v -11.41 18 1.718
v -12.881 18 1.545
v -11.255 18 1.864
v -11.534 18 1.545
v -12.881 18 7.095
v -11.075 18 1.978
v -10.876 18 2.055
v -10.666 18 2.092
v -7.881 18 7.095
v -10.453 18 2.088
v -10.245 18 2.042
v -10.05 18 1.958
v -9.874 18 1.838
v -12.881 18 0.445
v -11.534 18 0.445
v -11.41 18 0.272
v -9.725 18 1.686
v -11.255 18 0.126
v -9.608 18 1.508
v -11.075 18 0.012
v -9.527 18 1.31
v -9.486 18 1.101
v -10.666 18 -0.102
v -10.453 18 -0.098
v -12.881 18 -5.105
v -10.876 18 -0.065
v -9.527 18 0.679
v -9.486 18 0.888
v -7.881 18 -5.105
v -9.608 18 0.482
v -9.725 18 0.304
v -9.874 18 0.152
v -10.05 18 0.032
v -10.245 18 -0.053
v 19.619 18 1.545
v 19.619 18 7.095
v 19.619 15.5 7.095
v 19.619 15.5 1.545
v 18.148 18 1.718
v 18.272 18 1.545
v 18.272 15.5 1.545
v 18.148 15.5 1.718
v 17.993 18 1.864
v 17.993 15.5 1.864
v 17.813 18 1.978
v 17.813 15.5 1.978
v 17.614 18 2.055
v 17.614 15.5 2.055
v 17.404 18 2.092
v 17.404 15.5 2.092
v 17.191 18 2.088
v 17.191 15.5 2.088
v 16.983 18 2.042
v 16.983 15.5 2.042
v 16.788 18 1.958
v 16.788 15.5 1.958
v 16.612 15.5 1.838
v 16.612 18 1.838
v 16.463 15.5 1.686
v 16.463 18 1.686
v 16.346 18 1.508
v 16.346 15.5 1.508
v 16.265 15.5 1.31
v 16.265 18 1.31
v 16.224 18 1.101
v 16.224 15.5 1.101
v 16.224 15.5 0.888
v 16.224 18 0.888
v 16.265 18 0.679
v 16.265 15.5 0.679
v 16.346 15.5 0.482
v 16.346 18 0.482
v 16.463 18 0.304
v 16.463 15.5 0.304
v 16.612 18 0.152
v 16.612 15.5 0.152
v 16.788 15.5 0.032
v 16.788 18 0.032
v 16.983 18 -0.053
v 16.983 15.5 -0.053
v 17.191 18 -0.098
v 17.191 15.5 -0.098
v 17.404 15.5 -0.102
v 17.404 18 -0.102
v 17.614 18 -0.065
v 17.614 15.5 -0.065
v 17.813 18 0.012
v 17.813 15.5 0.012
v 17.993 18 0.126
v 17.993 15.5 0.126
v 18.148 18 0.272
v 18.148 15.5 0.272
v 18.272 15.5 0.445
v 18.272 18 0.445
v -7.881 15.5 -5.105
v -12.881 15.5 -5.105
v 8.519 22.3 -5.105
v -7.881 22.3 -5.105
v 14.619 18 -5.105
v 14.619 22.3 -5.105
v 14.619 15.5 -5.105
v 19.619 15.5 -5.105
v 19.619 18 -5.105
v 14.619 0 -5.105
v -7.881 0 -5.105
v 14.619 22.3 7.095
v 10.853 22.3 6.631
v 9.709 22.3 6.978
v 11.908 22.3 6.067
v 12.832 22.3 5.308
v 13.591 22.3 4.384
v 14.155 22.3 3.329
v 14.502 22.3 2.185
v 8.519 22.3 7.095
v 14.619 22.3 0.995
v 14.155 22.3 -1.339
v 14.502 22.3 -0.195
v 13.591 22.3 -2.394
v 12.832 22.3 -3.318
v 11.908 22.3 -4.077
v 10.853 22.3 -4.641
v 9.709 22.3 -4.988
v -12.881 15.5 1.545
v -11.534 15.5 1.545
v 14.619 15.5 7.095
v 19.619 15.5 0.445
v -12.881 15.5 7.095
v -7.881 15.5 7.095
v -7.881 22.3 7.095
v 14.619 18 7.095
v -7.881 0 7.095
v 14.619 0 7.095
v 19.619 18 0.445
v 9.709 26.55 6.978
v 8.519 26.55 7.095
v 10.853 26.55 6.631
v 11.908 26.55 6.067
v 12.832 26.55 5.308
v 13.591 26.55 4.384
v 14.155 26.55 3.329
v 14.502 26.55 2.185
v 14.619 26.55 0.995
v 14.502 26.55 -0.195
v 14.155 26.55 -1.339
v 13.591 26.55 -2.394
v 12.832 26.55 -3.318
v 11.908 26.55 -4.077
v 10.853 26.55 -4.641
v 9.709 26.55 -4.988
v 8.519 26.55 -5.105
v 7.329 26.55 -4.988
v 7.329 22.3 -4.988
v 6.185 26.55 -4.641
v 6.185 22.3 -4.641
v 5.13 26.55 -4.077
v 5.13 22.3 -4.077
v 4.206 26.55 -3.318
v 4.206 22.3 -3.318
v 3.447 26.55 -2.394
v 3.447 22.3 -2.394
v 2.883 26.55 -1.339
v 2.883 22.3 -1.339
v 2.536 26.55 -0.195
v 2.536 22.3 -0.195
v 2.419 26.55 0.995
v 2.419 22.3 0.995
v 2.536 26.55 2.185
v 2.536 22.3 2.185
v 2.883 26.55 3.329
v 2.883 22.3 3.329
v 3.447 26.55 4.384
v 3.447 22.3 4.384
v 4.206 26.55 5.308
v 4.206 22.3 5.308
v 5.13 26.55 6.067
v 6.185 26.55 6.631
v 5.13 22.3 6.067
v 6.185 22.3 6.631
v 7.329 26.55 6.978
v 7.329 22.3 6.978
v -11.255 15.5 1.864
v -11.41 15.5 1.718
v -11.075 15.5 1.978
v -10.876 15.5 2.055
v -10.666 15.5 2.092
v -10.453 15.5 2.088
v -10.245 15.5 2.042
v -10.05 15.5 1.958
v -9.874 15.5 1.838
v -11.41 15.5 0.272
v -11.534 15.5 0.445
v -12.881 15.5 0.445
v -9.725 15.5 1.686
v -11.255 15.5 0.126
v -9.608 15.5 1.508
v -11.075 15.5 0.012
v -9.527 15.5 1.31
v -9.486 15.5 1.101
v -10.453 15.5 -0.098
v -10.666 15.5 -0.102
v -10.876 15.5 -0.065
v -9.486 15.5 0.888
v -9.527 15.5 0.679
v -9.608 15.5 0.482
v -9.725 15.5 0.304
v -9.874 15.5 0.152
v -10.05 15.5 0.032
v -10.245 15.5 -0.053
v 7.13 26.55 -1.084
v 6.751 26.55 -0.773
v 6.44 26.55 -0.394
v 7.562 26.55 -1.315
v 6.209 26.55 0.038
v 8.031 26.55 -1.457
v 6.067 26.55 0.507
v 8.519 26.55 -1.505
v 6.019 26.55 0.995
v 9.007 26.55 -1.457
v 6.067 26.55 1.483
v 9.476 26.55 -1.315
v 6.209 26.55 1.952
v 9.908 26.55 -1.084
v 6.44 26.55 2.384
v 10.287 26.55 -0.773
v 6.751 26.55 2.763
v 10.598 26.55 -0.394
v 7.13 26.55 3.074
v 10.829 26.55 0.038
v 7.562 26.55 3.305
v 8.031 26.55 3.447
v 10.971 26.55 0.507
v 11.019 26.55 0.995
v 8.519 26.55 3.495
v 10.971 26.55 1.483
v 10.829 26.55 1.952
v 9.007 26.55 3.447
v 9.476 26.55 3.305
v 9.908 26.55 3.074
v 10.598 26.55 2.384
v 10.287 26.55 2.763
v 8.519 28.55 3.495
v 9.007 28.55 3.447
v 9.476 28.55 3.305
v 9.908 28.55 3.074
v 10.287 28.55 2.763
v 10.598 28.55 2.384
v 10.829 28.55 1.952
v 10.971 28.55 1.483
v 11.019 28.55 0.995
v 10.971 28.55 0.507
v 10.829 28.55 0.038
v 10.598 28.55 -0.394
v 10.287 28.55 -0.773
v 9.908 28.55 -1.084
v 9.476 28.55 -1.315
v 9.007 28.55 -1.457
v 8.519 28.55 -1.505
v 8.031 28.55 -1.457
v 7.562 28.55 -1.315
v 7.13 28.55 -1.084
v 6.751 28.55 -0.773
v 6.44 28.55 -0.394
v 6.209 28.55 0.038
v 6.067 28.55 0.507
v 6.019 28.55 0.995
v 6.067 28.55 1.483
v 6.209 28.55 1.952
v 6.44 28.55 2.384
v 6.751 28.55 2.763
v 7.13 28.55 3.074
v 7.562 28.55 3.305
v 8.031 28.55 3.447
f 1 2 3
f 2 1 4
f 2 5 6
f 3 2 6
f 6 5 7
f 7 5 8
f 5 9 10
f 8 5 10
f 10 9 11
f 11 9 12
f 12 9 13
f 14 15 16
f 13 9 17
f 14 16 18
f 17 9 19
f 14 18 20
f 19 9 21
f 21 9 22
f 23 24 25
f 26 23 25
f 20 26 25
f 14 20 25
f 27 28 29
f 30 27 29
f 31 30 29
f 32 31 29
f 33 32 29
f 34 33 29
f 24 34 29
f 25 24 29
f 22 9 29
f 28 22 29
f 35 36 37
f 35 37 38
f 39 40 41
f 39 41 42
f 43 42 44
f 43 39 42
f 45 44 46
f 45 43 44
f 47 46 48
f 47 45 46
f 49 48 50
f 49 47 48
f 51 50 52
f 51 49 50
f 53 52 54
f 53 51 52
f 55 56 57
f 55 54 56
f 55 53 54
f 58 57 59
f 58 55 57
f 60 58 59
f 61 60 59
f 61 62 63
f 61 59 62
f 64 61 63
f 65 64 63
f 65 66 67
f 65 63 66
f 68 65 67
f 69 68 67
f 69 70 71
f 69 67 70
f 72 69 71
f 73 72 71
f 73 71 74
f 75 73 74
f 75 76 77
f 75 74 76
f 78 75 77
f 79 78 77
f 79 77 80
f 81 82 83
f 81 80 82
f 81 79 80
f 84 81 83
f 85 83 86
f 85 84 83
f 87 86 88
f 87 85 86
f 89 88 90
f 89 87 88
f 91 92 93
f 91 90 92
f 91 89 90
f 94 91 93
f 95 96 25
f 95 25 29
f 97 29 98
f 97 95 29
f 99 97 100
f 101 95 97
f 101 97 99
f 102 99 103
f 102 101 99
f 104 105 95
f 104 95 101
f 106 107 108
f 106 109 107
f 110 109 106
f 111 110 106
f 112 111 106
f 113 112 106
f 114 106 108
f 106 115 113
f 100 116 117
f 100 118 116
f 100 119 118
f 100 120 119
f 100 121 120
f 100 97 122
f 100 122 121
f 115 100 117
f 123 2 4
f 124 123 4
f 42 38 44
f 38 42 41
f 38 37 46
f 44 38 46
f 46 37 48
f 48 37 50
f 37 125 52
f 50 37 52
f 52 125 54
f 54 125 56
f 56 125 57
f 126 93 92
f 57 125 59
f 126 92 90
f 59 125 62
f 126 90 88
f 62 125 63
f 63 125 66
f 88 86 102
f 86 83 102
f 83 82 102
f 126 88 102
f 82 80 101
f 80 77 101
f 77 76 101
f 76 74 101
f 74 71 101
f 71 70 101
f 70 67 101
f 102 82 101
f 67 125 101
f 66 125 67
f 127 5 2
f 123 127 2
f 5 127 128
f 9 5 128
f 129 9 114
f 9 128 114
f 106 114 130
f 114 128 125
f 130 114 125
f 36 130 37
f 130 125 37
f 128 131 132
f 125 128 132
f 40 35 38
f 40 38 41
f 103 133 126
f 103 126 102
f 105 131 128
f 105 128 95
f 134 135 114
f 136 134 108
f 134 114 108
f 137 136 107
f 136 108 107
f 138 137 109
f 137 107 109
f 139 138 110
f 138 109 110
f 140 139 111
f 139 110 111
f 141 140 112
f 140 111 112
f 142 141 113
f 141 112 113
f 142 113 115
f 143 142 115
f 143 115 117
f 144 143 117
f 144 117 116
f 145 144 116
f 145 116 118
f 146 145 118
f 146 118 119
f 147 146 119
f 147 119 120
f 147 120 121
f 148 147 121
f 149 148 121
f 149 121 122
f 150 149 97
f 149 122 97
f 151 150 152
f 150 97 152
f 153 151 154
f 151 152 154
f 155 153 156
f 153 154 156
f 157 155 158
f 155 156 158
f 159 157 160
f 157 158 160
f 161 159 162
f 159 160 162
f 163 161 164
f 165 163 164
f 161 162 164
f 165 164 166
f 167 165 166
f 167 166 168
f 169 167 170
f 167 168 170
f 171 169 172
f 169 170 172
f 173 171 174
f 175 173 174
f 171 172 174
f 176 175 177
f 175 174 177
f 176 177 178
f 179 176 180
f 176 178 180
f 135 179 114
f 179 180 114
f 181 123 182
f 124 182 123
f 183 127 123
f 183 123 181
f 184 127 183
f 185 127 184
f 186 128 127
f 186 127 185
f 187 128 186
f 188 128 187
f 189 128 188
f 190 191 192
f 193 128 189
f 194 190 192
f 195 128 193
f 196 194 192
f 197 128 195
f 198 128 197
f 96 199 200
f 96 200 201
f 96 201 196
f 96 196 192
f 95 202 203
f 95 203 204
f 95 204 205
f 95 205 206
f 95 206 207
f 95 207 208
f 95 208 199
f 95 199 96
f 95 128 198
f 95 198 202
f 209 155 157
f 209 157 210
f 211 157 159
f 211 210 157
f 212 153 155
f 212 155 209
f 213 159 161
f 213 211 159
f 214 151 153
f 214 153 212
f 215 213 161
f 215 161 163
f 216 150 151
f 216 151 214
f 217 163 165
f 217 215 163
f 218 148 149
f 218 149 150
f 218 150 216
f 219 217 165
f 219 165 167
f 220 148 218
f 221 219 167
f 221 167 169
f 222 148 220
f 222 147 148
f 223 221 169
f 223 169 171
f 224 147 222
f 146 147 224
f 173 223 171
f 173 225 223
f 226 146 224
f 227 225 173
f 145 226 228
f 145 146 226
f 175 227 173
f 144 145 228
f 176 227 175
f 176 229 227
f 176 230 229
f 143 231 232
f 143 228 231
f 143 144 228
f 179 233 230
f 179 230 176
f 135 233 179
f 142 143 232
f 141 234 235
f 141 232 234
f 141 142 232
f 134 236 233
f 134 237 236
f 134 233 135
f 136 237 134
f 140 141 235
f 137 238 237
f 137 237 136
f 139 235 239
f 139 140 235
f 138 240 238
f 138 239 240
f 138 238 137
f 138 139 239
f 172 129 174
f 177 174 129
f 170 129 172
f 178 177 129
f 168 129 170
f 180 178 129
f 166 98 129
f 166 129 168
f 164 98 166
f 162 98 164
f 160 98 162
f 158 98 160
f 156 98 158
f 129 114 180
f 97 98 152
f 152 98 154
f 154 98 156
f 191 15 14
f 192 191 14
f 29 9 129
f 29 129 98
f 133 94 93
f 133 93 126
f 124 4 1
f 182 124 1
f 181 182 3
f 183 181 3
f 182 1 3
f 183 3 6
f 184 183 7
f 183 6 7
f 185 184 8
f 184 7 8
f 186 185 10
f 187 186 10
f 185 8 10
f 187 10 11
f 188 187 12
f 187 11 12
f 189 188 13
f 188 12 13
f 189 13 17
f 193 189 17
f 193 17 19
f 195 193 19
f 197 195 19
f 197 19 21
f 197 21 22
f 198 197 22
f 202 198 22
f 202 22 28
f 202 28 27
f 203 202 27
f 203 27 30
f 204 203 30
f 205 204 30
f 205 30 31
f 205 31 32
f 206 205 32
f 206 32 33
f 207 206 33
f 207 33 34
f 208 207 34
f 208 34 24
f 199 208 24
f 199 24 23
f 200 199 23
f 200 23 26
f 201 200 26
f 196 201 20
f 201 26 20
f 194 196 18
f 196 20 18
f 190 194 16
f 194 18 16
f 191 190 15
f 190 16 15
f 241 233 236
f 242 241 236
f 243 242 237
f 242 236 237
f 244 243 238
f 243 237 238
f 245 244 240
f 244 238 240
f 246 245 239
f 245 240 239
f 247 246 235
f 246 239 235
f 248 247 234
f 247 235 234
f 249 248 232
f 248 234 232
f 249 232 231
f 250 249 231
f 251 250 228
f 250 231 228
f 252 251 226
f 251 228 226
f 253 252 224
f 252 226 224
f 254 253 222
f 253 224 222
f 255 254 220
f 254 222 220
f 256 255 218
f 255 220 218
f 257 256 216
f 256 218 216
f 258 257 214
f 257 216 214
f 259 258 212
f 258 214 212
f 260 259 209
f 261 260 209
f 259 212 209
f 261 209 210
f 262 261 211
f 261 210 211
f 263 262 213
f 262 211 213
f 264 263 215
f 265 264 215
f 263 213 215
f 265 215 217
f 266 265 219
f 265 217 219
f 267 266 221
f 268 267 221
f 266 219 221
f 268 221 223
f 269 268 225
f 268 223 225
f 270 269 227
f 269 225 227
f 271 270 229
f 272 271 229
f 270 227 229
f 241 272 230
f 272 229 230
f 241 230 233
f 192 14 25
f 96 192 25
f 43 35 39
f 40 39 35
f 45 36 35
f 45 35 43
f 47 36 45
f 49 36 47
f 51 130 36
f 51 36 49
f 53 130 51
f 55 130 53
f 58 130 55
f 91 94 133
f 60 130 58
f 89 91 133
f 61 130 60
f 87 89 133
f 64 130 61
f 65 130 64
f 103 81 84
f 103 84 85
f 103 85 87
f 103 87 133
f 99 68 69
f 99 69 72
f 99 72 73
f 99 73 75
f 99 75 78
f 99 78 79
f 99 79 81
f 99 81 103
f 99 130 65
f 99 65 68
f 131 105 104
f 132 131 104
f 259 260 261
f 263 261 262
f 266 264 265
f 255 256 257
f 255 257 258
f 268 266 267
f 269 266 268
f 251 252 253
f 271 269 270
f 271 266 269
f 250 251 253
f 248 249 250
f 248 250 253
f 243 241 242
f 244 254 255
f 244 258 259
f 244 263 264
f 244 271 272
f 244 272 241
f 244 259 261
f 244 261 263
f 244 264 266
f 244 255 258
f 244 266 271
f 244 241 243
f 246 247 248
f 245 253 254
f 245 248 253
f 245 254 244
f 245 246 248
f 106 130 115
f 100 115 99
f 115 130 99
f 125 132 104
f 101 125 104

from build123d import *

# Parameters (mm, degrees)
SKETCH1_W           = 22.5
SKETCH1_H           = 12.2
BOSS_EXTRUDE1_DEPTH = 22.3
SKETCH2_W           = 12.2
SKETCH2_H           = 2.5
BOSS_EXTRUDE2_DEPTH = 5
CUT_EXTRUDE1_DEPTH  = 28.554396191
SKETCH5_R           = 6.1
BOSS_EXTRUDE3_DEPTH = 4.25
SKETCH6_R           = 2.5
BOSS_EXTRUDE4_DEPTH = 2


with BuildPart() as part:
    # Sketch1 → Boss-Extrude1 (new body)
    with BuildSketch(Plane(origin=(0, 0, 0), x_dir=(1, 0, 0), z_dir=(0, 1, 0))):
        with Locations((3.369036145, -0.994939759)):
            Rectangle(SKETCH1_W, SKETCH1_H)
    extrude(amount=BOSS_EXTRUDE1_DEPTH)

    # Sketch2 → Boss-Extrude2 (add)
    with BuildSketch(Plane(origin=(14.619036145, 0, 0), x_dir=(0, 0, -1), z_dir=(1, 0, 0))):
        with Locations((-0.994939759, 16.75)):
            Rectangle(SKETCH2_W, SKETCH2_H)
    boss_extrude2 = extrude(amount=BOSS_EXTRUDE2_DEPTH)

    # Sketch3 → Cut-Extrude1 (cut, through all)
    with BuildSketch(Plane(origin=(0, 18, 0), x_dir=(1, 0, 0), z_dir=(0, 1, 0))):
        with BuildLine():
            Line((18.271664089, -0.444939759), (19.619036145, -0.444939759))
            Line((19.619036145, -0.444939759), (19.619036145, -1.544939759))
            Line((19.619036145, -1.544939759), (18.271664089, -1.544939759))
            ThreePointArc((18.271664089, -1.544939759), (16.219036145, -0.994939759), (18.271664089, -0.444939759))
        make_face()
    cut_extrude1 = extrude(amount=-CUT_EXTRUDE1_DEPTH, mode=Mode.SUBTRACT)

    # Mirror1: Boss-Extrude2, Cut-Extrude1 across plane
    add(boss_extrude2.mirror(Plane(origin=(3.369036145, 0, 0), x_dir=(0, 0, 1), z_dir=(1, 0, 0))))
    add(cut_extrude1.mirror(Plane(origin=(3.369036145, 0, 0), x_dir=(0, 0, 1), z_dir=(1, 0, 0))), mode=Mode.SUBTRACT)

    # Sketch5 → Boss-Extrude3 (add)
    with BuildSketch(Plane(origin=(0, 22.3, 0), x_dir=(1, 0, 0), z_dir=(0, 1, 0))):
        with Locations(Location((8.519036145, -0.994939759, 0), (0, 0, 270))):
            Circle(SKETCH5_R)
    extrude(amount=BOSS_EXTRUDE3_DEPTH)

    # Sketch6 → Boss-Extrude4 (add)
    with BuildSketch(Plane(origin=(0, 26.55, 0), x_dir=(1, 0, 0), z_dir=(0, 1, 0))):
        with Locations(Location((8.519036145, -0.994939759, 0), (0, 0, 270))):
            Circle(SKETCH6_R)
    extrude(amount=BOSS_EXTRUDE4_DEPTH)


solid = part.part
